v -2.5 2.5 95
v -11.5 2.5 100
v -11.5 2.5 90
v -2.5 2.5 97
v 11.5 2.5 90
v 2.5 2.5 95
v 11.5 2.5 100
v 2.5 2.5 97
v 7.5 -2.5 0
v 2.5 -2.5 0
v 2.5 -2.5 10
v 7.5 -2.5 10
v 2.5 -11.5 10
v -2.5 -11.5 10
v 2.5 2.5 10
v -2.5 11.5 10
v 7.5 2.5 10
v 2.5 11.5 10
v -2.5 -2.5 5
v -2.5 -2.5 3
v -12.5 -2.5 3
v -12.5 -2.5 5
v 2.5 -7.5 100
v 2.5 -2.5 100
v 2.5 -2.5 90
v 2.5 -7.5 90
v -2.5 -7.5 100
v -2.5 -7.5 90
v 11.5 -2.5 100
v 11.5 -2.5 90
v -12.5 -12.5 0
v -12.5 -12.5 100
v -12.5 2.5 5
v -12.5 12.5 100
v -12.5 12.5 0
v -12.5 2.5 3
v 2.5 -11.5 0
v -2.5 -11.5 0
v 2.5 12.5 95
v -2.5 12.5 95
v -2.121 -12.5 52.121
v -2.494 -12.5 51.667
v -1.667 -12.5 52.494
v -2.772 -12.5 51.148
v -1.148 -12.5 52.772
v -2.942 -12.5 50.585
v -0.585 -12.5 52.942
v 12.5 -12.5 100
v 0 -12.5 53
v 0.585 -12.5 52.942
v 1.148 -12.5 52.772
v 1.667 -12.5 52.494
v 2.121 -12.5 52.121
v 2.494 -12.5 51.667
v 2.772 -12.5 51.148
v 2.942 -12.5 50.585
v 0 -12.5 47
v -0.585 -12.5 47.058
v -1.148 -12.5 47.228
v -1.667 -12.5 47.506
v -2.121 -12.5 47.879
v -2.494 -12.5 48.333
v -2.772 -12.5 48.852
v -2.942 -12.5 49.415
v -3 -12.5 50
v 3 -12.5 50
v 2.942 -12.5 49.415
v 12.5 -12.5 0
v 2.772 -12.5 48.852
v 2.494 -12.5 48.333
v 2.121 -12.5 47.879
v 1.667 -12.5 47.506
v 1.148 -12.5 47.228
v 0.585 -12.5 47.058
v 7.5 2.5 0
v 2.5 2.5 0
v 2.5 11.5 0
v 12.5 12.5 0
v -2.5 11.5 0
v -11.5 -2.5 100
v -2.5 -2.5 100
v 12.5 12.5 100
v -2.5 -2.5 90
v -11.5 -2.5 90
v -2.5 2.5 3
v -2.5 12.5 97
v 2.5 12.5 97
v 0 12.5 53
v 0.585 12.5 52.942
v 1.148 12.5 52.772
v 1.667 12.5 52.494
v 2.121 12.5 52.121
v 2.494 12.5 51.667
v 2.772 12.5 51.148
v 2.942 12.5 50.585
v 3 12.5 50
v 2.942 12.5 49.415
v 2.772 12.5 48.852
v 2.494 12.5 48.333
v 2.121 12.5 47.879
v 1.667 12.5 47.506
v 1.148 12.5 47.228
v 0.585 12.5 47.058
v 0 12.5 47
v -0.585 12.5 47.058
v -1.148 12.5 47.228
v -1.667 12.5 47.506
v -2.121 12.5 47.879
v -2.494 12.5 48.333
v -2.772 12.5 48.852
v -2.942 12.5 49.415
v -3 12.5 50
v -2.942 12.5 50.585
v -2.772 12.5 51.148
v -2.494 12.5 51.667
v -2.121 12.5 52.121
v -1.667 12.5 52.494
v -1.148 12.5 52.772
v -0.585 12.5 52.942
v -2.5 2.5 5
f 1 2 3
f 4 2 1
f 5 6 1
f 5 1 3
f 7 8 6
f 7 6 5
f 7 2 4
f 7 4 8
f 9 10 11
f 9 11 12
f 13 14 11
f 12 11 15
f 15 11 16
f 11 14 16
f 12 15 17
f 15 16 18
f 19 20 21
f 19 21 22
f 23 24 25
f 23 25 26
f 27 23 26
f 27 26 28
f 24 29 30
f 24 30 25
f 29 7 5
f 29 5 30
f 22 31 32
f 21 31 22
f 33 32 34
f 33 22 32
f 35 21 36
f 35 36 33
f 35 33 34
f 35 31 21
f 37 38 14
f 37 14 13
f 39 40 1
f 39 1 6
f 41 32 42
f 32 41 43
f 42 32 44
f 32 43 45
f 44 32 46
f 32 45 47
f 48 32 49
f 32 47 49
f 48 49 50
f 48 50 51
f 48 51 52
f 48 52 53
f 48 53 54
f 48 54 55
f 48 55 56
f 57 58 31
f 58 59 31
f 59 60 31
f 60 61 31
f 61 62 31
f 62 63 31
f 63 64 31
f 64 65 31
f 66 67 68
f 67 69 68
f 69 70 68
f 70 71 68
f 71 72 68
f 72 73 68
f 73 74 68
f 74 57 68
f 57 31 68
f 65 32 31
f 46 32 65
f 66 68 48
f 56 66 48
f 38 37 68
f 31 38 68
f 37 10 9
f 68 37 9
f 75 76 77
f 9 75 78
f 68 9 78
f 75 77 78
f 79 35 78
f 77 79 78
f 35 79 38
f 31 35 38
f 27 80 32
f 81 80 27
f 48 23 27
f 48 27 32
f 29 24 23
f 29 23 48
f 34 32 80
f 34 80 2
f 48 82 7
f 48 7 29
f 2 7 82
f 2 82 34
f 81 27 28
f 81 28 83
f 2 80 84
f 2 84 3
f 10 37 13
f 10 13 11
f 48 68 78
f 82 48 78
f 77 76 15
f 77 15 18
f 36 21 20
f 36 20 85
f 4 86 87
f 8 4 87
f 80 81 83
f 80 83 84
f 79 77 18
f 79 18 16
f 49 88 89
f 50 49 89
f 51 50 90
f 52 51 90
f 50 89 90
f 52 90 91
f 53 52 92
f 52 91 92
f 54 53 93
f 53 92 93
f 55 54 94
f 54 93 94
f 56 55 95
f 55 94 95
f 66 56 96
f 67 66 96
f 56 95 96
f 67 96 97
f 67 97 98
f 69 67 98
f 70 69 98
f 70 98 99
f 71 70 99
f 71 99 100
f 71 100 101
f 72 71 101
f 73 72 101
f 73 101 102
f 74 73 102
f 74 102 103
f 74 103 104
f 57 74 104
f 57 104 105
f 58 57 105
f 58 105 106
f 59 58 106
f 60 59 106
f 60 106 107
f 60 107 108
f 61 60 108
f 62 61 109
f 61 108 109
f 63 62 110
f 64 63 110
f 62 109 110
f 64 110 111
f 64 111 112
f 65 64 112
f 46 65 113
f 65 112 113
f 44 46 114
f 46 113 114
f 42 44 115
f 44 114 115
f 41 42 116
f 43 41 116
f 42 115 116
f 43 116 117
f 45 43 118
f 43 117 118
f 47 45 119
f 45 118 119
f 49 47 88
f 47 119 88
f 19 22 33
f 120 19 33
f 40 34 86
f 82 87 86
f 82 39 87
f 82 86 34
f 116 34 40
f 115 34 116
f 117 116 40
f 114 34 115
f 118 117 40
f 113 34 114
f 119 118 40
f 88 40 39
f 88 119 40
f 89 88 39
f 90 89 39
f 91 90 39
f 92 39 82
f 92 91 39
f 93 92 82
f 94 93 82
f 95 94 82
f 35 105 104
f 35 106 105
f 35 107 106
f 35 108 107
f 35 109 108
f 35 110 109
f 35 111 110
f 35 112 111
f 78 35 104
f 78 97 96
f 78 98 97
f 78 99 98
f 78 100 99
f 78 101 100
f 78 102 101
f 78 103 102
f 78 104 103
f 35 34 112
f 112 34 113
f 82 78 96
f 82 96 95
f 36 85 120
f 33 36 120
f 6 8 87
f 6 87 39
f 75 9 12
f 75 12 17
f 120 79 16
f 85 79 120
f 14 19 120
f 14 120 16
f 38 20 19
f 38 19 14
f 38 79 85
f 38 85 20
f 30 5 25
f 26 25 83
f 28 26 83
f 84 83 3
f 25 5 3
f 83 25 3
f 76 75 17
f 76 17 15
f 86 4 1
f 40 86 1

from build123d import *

# Parameters (mm, degrees)
ESQUISSE1_W             = 25
ESQUISSE1_H             = 25
BOSS_EXTRU_1_DEPTH      = 100
ENL_V_MAT_EXTRU_2_DEPTH = 10
ESQUISSE9_R             = 3
ENL_V_MAT_EXTRU_4_DEPTH = 54
ENL_V_MAT_EXTRU_5_DEPTH = 10
ESQUISSE10_W            = 5
ESQUISSE10_H            = 2
ENL_V_MAT_EXTRU_6_DEPTH = 13
ESQUISSE11_W            = 2
ESQUISSE11_H            = 5
ENL_V_MAT_EXTRU_7_DEPTH = 13


with BuildPart() as part:
    # Esquisse1 → Boss.-Extru.1 (new body)
    with BuildSketch(Plane.XY):
        Rectangle(ESQUISSE1_W, ESQUISSE1_H)
    extrude(amount=BOSS_EXTRU_1_DEPTH)

    # Esquisse3 → Enlèv. mat.-Extru.2 (cut)
    with BuildSketch(Plane.XY.offset(100)):
        Polygon((-11.5, 2.5), (11.5, 2.5), (11.5, -2.5), (2.5, -2.5), (2.5, -7.5), (-2.5, -7.5), (-2.5, -2.5), (-11.5, -2.5), align=None)
    extrude(amount=-ENL_V_MAT_EXTRU_2_DEPTH, mode=Mode.SUBTRACT)

    # Esquisse9 → Enlèv. mat.-Extru.4 (cut)
    with BuildSketch(Plane(origin=(0, 12.5, 0), x_dir=(1, 0, 0), z_dir=(0, 1, 0))):
        with Locations(Location((0, -50, 0), (0, 0, 270))):
            Circle(ESQUISSE9_R)
    extrude(amount=-ENL_V_MAT_EXTRU_4_DEPTH, mode=Mode.SUBTRACT)

    # Esquisse4 → Enlèv. mat.-Extru.5 (cut)
    with BuildSketch(Plane.XY):
        Polygon((2.5, 11.5), (-2.5, 11.5), (-2.5, -11.5), (2.5, -11.5), (2.5, -2.5), (7.5, -2.5), (7.5, 2.5), (2.5, 2.5), align=None)
    extrude(amount=ENL_V_MAT_EXTRU_5_DEPTH, mode=Mode.SUBTRACT)

    # Esquisse10 → Enlèv. mat.-Extru.6 (cut)
    with BuildSketch(Plane(origin=(0, 12.5, 0), x_dir=(1, 0, 0), z_dir=(0, 1, 0))):
        with Locations((0, -96)):
            Rectangle(ESQUISSE10_W, ESQUISSE10_H)
    extrude(amount=-ENL_V_MAT_EXTRU_6_DEPTH, mode=Mode.SUBTRACT)

    # Esquisse11 → Enlèv. mat.-Extru.7 (cut)
    with BuildSketch(Plane.ZY.offset(12.5)):
        with Locations((4, 0)):
            Rectangle(ESQUISSE11_W, ESQUISSE11_H)
    extrude(amount=-ENL_V_MAT_EXTRU_7_DEPTH, mode=Mode.SUBTRACT)


solid = part.part
